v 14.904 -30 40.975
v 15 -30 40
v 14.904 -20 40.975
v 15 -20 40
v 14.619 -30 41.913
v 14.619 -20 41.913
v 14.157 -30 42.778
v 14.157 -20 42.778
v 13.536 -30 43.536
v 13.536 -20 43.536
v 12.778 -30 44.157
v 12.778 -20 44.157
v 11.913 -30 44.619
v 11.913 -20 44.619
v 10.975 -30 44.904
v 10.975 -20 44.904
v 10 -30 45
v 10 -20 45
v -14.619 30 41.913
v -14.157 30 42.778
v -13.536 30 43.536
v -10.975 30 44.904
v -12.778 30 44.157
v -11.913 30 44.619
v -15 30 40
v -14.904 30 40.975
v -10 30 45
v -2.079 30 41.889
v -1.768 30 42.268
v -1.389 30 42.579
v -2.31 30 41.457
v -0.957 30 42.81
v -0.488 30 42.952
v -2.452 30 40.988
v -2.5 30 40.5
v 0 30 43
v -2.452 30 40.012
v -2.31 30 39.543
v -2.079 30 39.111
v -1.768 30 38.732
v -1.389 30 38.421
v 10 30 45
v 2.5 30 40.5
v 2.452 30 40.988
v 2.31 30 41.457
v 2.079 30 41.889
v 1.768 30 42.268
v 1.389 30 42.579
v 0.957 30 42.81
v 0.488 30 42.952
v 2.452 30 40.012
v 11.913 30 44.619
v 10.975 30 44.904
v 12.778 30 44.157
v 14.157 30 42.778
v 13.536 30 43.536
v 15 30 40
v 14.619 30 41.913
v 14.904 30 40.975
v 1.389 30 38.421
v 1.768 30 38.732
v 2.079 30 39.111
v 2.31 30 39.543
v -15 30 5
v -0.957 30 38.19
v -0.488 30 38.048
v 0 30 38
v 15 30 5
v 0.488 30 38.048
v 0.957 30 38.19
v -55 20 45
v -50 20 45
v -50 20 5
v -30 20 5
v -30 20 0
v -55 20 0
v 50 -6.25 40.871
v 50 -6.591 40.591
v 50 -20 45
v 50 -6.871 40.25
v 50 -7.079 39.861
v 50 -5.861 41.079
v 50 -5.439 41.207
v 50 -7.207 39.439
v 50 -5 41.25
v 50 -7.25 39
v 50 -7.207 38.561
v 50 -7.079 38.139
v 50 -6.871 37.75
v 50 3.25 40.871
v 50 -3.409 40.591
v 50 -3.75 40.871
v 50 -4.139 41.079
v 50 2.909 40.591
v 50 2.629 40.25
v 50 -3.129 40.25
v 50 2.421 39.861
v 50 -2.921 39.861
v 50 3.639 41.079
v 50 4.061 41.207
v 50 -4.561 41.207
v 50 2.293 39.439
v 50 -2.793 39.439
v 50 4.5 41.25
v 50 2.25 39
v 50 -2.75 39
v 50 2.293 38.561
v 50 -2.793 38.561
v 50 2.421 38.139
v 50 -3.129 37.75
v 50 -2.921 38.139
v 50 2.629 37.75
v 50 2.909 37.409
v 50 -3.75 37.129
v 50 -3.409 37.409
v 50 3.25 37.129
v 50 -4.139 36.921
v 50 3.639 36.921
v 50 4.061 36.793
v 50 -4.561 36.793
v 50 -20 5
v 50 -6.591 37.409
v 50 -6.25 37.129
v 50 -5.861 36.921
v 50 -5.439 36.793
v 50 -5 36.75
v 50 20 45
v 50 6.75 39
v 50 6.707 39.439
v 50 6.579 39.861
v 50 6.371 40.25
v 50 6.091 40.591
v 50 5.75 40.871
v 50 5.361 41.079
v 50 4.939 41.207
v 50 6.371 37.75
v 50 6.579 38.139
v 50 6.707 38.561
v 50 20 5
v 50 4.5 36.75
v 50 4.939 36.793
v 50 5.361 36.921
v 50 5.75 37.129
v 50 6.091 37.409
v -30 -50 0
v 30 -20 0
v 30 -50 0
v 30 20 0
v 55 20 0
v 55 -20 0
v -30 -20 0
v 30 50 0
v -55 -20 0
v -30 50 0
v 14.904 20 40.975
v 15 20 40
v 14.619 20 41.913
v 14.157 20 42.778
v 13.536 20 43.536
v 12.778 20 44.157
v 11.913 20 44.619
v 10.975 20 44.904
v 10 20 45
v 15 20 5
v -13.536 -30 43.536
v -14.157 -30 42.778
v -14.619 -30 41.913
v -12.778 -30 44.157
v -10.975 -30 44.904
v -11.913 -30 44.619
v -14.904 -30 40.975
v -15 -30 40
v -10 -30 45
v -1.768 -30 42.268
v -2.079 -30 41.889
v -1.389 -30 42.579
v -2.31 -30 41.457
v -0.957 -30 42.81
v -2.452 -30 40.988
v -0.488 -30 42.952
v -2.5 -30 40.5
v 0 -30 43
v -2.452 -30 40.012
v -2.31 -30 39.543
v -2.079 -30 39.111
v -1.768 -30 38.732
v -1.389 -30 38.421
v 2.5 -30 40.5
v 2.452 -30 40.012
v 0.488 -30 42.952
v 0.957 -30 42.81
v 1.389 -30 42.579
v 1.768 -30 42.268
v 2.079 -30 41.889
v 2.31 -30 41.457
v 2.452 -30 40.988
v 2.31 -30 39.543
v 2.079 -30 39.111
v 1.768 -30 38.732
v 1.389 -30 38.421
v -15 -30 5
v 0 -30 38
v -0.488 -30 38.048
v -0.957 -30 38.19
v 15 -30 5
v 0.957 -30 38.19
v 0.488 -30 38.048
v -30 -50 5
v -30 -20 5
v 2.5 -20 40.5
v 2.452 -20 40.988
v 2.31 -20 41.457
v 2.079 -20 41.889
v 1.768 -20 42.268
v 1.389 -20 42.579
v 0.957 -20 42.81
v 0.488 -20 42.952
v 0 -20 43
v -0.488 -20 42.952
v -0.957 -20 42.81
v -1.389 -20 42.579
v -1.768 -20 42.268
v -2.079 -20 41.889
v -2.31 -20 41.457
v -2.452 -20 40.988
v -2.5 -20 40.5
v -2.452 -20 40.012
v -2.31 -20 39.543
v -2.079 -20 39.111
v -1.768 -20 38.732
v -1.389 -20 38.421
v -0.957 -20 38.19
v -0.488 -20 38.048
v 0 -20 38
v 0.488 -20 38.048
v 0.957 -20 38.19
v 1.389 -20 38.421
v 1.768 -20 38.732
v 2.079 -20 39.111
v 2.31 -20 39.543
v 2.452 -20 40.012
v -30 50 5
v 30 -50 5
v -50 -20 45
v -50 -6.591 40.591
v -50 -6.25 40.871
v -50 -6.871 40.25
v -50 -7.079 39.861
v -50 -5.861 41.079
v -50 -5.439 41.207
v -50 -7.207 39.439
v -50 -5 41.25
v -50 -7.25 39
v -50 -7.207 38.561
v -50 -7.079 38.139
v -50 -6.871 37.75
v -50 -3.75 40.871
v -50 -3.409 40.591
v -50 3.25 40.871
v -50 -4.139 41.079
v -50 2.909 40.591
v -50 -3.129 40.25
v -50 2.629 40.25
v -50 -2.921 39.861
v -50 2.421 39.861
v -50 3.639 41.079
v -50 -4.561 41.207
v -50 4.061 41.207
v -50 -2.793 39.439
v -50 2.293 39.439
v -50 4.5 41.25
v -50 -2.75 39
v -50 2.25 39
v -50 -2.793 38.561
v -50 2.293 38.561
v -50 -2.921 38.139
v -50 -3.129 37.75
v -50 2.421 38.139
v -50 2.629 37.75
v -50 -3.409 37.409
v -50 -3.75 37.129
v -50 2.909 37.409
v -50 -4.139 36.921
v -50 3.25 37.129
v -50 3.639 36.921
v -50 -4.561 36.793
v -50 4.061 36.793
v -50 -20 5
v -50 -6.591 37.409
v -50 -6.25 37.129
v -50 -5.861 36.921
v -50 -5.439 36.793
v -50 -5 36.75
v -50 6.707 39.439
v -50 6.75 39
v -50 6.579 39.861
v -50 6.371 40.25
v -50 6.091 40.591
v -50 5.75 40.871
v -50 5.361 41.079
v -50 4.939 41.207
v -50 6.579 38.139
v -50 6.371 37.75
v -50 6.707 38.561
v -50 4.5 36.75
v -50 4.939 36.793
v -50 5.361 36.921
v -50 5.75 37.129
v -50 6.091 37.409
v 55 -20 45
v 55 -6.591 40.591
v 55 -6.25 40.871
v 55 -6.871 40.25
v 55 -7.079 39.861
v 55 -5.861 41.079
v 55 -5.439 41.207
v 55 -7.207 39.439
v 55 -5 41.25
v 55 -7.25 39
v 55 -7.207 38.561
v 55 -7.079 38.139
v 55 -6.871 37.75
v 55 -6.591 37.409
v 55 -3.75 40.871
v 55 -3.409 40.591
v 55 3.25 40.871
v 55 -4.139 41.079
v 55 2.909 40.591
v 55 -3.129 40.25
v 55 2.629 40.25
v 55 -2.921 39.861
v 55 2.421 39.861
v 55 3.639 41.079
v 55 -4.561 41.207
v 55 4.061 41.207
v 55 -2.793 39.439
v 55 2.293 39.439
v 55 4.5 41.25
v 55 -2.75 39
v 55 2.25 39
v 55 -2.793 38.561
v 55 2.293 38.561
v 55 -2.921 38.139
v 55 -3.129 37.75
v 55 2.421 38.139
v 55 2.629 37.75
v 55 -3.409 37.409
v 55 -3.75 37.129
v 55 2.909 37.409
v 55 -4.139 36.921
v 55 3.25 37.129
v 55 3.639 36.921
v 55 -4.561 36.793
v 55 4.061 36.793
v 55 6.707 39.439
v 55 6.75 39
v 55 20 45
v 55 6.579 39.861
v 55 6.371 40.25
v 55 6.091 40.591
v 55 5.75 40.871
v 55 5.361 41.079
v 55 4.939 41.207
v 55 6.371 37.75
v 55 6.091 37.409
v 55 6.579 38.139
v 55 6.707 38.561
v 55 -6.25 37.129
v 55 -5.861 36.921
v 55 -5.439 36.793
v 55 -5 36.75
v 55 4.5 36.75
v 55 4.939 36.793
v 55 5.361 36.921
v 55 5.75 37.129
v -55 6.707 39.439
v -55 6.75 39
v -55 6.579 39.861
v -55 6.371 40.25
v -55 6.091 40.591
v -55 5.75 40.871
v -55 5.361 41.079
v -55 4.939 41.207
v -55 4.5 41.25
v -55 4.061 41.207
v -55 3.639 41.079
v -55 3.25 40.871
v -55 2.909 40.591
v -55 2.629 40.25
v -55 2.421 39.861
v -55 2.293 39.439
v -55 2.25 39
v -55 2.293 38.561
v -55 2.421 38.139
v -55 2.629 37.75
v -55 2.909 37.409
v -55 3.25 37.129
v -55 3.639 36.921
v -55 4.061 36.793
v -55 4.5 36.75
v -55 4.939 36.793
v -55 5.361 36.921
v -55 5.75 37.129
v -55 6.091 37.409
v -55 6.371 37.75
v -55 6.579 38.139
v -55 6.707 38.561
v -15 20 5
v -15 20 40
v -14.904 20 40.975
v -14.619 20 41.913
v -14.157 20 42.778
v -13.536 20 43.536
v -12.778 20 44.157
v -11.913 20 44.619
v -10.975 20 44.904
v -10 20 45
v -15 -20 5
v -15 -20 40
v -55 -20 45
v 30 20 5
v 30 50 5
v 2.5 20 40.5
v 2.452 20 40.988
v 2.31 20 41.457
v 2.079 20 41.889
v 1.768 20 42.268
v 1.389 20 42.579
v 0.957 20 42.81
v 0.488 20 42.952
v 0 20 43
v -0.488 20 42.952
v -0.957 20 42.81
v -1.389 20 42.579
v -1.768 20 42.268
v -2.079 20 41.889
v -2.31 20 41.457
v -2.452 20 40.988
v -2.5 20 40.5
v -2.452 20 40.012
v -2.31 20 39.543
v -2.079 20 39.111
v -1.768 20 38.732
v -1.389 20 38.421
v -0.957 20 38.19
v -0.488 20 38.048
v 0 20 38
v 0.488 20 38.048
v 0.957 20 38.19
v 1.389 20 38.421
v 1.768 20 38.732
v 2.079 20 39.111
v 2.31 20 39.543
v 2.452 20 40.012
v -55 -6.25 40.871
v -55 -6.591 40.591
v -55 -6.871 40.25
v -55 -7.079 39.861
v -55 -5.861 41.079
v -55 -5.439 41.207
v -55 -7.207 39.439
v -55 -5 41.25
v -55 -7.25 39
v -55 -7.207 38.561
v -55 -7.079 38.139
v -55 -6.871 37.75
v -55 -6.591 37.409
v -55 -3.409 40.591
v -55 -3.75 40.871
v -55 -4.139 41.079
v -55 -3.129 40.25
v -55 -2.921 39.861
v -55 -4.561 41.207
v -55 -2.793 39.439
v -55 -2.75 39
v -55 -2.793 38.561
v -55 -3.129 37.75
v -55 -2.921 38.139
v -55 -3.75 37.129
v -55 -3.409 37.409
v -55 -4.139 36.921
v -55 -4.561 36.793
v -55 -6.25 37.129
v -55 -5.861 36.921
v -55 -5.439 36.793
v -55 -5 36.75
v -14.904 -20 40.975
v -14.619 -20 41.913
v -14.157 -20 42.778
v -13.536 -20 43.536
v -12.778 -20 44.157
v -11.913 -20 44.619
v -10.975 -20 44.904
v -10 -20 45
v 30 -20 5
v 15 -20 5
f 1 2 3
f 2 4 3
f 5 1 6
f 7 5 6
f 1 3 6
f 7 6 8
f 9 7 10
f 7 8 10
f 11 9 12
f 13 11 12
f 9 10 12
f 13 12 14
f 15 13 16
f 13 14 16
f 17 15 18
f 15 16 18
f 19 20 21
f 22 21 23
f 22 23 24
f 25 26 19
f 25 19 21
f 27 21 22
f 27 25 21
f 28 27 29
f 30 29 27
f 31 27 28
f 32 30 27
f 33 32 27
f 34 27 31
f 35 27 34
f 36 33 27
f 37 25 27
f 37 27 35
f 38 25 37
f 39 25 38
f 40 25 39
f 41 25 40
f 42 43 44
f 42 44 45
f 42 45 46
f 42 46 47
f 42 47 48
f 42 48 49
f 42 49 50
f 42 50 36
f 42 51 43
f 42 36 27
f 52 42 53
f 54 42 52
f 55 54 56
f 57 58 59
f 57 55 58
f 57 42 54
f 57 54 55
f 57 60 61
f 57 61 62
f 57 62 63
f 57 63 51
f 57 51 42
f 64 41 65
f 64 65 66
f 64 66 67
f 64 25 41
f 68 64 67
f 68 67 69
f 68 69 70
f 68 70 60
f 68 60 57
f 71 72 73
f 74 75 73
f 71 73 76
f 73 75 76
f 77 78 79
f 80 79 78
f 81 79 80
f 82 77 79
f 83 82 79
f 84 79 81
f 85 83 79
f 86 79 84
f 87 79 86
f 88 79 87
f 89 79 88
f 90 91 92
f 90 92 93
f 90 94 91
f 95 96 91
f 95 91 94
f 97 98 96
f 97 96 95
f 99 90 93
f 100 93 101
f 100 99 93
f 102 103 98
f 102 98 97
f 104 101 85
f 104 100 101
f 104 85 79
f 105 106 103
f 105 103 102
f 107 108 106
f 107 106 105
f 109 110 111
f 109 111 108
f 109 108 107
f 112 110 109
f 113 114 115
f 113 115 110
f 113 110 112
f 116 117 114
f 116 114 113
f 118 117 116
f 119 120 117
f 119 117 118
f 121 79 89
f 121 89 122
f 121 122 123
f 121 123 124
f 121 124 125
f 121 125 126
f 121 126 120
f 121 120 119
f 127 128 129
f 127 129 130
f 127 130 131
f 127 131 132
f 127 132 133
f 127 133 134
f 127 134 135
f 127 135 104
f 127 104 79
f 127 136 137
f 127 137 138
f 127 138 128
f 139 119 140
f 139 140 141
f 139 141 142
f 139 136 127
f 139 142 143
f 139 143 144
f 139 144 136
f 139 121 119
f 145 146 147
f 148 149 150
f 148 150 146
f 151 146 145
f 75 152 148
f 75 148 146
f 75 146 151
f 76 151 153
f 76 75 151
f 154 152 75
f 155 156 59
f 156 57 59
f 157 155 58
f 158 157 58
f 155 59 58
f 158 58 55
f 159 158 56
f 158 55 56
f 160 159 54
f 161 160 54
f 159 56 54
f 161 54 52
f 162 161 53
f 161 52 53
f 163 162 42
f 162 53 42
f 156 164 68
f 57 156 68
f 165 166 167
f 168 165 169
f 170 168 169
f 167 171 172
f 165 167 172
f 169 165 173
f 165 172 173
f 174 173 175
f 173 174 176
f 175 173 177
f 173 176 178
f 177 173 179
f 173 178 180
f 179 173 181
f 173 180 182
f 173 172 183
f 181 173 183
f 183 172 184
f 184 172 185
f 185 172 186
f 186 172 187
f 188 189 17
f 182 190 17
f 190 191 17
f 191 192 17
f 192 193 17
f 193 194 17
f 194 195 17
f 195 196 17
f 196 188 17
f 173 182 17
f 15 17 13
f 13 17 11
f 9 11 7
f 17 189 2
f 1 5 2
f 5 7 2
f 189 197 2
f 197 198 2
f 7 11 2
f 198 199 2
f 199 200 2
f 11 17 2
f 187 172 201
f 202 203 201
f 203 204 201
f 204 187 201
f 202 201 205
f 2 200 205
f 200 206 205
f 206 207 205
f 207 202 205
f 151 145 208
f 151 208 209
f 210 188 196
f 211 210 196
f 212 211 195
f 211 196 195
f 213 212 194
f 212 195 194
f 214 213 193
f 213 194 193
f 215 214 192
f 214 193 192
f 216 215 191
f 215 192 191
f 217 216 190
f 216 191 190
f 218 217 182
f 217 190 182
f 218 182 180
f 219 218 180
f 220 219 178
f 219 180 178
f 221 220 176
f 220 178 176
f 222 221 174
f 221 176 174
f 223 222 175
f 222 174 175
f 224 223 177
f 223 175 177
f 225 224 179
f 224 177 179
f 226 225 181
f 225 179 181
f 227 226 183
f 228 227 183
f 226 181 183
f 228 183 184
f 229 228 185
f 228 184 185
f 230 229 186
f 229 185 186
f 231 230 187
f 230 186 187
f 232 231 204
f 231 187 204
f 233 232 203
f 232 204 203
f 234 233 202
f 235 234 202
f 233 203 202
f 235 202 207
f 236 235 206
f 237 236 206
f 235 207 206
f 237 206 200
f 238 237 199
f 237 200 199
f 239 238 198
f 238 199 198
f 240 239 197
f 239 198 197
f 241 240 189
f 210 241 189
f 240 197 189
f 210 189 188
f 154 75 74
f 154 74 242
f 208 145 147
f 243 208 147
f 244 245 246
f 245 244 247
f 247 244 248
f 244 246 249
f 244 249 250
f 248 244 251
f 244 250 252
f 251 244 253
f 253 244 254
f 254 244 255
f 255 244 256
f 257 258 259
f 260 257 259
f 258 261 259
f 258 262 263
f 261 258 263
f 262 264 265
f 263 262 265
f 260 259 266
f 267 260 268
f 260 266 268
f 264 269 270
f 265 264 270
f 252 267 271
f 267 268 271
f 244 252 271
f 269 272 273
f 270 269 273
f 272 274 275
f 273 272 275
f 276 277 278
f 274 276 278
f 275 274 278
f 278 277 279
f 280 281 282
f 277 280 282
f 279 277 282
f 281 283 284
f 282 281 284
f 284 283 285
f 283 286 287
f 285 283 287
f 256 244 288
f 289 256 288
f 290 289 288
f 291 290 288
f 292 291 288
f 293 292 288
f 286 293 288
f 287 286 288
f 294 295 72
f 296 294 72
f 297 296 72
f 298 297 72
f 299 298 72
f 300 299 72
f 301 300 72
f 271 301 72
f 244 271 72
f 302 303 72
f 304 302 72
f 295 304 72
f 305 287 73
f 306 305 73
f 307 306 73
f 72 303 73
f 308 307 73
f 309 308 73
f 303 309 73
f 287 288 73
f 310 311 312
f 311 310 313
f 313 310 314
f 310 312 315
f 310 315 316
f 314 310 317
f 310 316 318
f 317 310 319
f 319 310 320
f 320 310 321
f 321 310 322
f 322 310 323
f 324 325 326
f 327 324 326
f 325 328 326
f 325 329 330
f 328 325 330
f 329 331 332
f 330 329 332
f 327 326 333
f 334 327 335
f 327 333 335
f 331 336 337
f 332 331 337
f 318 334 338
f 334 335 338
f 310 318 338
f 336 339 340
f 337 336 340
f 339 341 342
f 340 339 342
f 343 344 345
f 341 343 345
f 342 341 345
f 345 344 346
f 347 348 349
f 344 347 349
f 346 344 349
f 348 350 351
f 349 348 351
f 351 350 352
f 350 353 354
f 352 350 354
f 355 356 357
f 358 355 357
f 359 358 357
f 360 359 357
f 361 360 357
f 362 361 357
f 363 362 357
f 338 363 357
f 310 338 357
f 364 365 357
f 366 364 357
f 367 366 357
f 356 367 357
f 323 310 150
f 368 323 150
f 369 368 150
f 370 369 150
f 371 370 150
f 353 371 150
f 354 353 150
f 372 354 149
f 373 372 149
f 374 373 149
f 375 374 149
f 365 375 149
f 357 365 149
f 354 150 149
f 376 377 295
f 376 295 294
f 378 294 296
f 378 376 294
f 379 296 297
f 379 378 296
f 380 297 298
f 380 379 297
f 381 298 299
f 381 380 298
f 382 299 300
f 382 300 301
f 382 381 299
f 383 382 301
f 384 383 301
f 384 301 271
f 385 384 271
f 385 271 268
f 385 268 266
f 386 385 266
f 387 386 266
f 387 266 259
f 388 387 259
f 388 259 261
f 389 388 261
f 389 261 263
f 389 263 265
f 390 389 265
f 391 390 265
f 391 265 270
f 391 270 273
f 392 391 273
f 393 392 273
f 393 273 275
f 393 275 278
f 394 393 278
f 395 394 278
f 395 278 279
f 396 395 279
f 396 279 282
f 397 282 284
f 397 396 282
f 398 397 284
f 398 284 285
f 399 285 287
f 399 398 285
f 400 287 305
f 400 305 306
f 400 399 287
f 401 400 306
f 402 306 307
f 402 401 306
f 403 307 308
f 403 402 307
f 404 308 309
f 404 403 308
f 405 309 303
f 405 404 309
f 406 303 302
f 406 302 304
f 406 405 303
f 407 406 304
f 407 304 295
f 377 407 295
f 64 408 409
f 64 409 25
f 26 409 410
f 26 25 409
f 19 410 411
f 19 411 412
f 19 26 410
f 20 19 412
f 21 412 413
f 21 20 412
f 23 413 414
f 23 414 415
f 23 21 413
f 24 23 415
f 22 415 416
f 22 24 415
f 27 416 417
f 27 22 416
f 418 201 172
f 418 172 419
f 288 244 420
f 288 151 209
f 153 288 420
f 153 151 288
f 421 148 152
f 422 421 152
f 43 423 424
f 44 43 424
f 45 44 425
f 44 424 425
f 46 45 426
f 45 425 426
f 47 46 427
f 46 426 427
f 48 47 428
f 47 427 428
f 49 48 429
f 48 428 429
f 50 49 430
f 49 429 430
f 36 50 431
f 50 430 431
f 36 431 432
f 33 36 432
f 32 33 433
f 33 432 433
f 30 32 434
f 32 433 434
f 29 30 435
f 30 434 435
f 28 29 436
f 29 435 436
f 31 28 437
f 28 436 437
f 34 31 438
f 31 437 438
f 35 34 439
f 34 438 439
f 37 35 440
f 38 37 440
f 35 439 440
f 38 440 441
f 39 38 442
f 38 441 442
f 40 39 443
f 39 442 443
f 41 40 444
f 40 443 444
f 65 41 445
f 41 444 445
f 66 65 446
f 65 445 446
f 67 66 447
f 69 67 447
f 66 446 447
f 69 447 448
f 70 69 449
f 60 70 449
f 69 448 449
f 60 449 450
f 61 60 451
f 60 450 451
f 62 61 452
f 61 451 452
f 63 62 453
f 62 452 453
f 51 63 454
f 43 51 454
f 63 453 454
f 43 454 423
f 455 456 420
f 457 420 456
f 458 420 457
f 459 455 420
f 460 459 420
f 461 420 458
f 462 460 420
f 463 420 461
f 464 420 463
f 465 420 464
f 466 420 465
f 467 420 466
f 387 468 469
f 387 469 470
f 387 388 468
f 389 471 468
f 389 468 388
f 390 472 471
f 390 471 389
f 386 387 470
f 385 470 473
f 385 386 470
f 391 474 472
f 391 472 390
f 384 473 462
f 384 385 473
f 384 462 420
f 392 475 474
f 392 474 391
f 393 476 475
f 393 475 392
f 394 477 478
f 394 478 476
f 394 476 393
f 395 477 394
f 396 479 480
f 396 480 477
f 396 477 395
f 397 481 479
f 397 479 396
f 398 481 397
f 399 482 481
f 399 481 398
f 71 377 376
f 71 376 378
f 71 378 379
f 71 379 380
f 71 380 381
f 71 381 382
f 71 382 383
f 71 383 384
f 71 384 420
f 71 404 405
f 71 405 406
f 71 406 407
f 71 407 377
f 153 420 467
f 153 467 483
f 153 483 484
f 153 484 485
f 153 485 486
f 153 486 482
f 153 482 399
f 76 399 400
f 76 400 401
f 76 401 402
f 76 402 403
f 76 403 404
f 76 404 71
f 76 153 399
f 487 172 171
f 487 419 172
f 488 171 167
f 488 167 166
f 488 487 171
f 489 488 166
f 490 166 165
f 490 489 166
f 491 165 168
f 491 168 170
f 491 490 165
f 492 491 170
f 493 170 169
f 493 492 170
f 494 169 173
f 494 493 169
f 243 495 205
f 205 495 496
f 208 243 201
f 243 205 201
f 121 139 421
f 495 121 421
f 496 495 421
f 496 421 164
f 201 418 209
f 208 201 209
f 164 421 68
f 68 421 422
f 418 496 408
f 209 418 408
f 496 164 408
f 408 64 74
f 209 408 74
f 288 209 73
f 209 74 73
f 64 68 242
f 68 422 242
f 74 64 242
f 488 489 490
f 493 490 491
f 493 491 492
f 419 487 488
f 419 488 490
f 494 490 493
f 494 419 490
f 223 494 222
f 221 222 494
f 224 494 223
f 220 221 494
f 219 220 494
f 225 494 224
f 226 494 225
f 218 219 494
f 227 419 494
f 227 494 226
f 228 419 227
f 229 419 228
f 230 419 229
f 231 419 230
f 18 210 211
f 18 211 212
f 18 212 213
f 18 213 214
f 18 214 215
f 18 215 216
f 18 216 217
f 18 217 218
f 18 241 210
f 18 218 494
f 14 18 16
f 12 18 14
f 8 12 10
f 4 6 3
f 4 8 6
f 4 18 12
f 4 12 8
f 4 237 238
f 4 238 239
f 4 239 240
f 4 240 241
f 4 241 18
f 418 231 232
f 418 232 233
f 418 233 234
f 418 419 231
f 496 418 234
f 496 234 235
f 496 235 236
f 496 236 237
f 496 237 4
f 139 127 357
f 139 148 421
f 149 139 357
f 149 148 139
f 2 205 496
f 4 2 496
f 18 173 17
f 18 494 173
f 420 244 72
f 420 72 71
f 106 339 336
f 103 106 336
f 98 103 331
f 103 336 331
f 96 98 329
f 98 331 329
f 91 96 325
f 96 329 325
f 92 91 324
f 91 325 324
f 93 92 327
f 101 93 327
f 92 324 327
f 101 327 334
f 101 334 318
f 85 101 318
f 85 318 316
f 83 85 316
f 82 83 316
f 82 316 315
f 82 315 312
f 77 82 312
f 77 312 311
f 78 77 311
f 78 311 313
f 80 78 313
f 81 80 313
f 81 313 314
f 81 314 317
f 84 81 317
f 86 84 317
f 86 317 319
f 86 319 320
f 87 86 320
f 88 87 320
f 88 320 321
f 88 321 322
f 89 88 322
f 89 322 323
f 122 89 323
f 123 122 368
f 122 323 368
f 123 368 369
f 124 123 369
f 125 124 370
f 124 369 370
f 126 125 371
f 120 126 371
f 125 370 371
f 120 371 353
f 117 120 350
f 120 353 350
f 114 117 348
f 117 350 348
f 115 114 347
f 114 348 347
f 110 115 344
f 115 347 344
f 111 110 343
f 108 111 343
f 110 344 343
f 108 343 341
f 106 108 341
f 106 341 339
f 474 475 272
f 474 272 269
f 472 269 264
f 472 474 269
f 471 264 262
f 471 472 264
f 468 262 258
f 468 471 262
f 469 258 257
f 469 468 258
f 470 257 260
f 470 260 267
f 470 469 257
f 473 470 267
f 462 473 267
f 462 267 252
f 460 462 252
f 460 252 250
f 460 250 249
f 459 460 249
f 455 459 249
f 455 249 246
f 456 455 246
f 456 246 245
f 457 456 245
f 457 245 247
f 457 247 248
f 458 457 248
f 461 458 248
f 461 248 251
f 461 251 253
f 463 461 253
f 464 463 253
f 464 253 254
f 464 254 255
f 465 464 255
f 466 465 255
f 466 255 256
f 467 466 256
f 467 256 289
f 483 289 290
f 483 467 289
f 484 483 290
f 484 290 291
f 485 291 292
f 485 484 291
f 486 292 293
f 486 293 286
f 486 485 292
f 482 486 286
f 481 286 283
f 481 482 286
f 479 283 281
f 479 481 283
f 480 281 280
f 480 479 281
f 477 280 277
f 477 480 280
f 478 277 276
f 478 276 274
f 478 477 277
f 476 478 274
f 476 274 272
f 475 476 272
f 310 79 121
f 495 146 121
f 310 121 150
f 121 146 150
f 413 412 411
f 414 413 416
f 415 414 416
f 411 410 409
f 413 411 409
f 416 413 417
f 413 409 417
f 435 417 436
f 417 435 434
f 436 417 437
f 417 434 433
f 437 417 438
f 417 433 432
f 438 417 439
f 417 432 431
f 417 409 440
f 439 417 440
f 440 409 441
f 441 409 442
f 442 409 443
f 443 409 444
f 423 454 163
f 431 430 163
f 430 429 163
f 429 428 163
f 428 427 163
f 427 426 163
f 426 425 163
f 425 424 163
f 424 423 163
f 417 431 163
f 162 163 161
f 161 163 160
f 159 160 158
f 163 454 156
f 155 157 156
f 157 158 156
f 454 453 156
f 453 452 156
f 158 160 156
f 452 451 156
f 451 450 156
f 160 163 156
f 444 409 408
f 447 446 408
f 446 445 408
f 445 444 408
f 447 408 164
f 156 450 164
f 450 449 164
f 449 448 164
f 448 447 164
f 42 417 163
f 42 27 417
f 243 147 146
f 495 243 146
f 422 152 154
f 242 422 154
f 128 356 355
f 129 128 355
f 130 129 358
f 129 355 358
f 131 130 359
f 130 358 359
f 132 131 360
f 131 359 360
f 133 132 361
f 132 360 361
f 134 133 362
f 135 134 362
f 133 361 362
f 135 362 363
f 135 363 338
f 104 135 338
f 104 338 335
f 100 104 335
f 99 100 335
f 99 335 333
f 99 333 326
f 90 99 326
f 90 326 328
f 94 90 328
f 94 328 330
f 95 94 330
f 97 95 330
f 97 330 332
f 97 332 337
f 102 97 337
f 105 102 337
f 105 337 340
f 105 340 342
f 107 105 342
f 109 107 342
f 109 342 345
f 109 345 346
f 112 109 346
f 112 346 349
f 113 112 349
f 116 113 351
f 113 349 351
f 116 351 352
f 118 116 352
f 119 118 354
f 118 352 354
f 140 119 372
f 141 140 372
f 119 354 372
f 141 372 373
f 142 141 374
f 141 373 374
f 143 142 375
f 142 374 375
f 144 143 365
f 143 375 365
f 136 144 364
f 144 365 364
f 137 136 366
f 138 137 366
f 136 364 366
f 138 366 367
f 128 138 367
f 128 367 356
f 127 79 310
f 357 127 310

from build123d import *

# Parameters (mm, degrees)
F0_W      = 30
F0_H      = 100
F1_DEPTH  = 5
F2_W      = 30
F2_H      = 10
F3_DEPTH  = 40
F4_R      = 5
F5_R      = 2.5
F6_DEPTH  = 80.001
F7_W      = 40
F7_H      = 5
F8_DEPTH  = 25
F9_W      = 5
F9_H      = 40
F10_DEPTH = 40
F11_R     = 2.25
F12_DEPTH = 25


with BuildPart() as f1:
    # F0 (on Top) → F1 (new body)
    with BuildSketch(Plane.XY):
        with Locations((-15, 0)):
            Rectangle(F0_W, F0_H)
        with Locations((15, 0)):
            Rectangle(F0_W, F0_H)
    extrude(amount=F1_DEPTH)

    # F2 (on face) → F3 (join)
    with BuildSketch(Plane.XY.offset(5)):
        with Locations((0, 25)):
            Rectangle(F2_W, F2_H)
        with Locations((0, -25)):
            Rectangle(F2_W, F2_H)
    extrude(amount=F3_DEPTH)

    # F4
    f4_edges = [f1.edges().sort_by_distance(p)[0] for p in [
        (-15, -25, 45),
        (15, -25, 45),
        (-15, 25, 45),
        (15, 25, 45),
    ]]
    fillet(f4_edges, radius=F4_R)

    # F5 (on face) → F6 (cut, through all)
    with BuildSketch(Plane.XZ.offset(30)):
        with Locations((0, 40.5)):
            Circle(F5_R)
    extrude(amount=-F6_DEPTH, mode=Mode.SUBTRACT)

    # F7 (on face) → F8 (join)
    with BuildSketch(Plane.YZ.offset(30)):
        with Locations((0, 2.5)):
            Rectangle(F7_W, F7_H)
    extrude(amount=F8_DEPTH)

    # F9 (on face) → F10 (join)
    with BuildSketch(Plane.XY.offset(5)):
        with Locations((52.5, 0)):
            Rectangle(F9_W, F9_H)
    extrude(amount=F10_DEPTH)

    # F11 (on face) → F12 (cut)
    with BuildSketch(Plane.YZ.offset(55)):
        with Locations((-5, 39)):
            Circle(F11_R)
        with Locations((4.5, 39)):
            Circle(F11_R)
    extrude(amount=-F12_DEPTH, mode=Mode.SUBTRACT)

    # F15: F1 across plane


with BuildPart() as f1_1:
    add(f1.part)
    add(f1.part.mirror(Plane(origin=(0, 0, 5.5), x_dir=(0, -1, 0), z_dir=(-1, 0, 0))))


solid = f1_1.part
